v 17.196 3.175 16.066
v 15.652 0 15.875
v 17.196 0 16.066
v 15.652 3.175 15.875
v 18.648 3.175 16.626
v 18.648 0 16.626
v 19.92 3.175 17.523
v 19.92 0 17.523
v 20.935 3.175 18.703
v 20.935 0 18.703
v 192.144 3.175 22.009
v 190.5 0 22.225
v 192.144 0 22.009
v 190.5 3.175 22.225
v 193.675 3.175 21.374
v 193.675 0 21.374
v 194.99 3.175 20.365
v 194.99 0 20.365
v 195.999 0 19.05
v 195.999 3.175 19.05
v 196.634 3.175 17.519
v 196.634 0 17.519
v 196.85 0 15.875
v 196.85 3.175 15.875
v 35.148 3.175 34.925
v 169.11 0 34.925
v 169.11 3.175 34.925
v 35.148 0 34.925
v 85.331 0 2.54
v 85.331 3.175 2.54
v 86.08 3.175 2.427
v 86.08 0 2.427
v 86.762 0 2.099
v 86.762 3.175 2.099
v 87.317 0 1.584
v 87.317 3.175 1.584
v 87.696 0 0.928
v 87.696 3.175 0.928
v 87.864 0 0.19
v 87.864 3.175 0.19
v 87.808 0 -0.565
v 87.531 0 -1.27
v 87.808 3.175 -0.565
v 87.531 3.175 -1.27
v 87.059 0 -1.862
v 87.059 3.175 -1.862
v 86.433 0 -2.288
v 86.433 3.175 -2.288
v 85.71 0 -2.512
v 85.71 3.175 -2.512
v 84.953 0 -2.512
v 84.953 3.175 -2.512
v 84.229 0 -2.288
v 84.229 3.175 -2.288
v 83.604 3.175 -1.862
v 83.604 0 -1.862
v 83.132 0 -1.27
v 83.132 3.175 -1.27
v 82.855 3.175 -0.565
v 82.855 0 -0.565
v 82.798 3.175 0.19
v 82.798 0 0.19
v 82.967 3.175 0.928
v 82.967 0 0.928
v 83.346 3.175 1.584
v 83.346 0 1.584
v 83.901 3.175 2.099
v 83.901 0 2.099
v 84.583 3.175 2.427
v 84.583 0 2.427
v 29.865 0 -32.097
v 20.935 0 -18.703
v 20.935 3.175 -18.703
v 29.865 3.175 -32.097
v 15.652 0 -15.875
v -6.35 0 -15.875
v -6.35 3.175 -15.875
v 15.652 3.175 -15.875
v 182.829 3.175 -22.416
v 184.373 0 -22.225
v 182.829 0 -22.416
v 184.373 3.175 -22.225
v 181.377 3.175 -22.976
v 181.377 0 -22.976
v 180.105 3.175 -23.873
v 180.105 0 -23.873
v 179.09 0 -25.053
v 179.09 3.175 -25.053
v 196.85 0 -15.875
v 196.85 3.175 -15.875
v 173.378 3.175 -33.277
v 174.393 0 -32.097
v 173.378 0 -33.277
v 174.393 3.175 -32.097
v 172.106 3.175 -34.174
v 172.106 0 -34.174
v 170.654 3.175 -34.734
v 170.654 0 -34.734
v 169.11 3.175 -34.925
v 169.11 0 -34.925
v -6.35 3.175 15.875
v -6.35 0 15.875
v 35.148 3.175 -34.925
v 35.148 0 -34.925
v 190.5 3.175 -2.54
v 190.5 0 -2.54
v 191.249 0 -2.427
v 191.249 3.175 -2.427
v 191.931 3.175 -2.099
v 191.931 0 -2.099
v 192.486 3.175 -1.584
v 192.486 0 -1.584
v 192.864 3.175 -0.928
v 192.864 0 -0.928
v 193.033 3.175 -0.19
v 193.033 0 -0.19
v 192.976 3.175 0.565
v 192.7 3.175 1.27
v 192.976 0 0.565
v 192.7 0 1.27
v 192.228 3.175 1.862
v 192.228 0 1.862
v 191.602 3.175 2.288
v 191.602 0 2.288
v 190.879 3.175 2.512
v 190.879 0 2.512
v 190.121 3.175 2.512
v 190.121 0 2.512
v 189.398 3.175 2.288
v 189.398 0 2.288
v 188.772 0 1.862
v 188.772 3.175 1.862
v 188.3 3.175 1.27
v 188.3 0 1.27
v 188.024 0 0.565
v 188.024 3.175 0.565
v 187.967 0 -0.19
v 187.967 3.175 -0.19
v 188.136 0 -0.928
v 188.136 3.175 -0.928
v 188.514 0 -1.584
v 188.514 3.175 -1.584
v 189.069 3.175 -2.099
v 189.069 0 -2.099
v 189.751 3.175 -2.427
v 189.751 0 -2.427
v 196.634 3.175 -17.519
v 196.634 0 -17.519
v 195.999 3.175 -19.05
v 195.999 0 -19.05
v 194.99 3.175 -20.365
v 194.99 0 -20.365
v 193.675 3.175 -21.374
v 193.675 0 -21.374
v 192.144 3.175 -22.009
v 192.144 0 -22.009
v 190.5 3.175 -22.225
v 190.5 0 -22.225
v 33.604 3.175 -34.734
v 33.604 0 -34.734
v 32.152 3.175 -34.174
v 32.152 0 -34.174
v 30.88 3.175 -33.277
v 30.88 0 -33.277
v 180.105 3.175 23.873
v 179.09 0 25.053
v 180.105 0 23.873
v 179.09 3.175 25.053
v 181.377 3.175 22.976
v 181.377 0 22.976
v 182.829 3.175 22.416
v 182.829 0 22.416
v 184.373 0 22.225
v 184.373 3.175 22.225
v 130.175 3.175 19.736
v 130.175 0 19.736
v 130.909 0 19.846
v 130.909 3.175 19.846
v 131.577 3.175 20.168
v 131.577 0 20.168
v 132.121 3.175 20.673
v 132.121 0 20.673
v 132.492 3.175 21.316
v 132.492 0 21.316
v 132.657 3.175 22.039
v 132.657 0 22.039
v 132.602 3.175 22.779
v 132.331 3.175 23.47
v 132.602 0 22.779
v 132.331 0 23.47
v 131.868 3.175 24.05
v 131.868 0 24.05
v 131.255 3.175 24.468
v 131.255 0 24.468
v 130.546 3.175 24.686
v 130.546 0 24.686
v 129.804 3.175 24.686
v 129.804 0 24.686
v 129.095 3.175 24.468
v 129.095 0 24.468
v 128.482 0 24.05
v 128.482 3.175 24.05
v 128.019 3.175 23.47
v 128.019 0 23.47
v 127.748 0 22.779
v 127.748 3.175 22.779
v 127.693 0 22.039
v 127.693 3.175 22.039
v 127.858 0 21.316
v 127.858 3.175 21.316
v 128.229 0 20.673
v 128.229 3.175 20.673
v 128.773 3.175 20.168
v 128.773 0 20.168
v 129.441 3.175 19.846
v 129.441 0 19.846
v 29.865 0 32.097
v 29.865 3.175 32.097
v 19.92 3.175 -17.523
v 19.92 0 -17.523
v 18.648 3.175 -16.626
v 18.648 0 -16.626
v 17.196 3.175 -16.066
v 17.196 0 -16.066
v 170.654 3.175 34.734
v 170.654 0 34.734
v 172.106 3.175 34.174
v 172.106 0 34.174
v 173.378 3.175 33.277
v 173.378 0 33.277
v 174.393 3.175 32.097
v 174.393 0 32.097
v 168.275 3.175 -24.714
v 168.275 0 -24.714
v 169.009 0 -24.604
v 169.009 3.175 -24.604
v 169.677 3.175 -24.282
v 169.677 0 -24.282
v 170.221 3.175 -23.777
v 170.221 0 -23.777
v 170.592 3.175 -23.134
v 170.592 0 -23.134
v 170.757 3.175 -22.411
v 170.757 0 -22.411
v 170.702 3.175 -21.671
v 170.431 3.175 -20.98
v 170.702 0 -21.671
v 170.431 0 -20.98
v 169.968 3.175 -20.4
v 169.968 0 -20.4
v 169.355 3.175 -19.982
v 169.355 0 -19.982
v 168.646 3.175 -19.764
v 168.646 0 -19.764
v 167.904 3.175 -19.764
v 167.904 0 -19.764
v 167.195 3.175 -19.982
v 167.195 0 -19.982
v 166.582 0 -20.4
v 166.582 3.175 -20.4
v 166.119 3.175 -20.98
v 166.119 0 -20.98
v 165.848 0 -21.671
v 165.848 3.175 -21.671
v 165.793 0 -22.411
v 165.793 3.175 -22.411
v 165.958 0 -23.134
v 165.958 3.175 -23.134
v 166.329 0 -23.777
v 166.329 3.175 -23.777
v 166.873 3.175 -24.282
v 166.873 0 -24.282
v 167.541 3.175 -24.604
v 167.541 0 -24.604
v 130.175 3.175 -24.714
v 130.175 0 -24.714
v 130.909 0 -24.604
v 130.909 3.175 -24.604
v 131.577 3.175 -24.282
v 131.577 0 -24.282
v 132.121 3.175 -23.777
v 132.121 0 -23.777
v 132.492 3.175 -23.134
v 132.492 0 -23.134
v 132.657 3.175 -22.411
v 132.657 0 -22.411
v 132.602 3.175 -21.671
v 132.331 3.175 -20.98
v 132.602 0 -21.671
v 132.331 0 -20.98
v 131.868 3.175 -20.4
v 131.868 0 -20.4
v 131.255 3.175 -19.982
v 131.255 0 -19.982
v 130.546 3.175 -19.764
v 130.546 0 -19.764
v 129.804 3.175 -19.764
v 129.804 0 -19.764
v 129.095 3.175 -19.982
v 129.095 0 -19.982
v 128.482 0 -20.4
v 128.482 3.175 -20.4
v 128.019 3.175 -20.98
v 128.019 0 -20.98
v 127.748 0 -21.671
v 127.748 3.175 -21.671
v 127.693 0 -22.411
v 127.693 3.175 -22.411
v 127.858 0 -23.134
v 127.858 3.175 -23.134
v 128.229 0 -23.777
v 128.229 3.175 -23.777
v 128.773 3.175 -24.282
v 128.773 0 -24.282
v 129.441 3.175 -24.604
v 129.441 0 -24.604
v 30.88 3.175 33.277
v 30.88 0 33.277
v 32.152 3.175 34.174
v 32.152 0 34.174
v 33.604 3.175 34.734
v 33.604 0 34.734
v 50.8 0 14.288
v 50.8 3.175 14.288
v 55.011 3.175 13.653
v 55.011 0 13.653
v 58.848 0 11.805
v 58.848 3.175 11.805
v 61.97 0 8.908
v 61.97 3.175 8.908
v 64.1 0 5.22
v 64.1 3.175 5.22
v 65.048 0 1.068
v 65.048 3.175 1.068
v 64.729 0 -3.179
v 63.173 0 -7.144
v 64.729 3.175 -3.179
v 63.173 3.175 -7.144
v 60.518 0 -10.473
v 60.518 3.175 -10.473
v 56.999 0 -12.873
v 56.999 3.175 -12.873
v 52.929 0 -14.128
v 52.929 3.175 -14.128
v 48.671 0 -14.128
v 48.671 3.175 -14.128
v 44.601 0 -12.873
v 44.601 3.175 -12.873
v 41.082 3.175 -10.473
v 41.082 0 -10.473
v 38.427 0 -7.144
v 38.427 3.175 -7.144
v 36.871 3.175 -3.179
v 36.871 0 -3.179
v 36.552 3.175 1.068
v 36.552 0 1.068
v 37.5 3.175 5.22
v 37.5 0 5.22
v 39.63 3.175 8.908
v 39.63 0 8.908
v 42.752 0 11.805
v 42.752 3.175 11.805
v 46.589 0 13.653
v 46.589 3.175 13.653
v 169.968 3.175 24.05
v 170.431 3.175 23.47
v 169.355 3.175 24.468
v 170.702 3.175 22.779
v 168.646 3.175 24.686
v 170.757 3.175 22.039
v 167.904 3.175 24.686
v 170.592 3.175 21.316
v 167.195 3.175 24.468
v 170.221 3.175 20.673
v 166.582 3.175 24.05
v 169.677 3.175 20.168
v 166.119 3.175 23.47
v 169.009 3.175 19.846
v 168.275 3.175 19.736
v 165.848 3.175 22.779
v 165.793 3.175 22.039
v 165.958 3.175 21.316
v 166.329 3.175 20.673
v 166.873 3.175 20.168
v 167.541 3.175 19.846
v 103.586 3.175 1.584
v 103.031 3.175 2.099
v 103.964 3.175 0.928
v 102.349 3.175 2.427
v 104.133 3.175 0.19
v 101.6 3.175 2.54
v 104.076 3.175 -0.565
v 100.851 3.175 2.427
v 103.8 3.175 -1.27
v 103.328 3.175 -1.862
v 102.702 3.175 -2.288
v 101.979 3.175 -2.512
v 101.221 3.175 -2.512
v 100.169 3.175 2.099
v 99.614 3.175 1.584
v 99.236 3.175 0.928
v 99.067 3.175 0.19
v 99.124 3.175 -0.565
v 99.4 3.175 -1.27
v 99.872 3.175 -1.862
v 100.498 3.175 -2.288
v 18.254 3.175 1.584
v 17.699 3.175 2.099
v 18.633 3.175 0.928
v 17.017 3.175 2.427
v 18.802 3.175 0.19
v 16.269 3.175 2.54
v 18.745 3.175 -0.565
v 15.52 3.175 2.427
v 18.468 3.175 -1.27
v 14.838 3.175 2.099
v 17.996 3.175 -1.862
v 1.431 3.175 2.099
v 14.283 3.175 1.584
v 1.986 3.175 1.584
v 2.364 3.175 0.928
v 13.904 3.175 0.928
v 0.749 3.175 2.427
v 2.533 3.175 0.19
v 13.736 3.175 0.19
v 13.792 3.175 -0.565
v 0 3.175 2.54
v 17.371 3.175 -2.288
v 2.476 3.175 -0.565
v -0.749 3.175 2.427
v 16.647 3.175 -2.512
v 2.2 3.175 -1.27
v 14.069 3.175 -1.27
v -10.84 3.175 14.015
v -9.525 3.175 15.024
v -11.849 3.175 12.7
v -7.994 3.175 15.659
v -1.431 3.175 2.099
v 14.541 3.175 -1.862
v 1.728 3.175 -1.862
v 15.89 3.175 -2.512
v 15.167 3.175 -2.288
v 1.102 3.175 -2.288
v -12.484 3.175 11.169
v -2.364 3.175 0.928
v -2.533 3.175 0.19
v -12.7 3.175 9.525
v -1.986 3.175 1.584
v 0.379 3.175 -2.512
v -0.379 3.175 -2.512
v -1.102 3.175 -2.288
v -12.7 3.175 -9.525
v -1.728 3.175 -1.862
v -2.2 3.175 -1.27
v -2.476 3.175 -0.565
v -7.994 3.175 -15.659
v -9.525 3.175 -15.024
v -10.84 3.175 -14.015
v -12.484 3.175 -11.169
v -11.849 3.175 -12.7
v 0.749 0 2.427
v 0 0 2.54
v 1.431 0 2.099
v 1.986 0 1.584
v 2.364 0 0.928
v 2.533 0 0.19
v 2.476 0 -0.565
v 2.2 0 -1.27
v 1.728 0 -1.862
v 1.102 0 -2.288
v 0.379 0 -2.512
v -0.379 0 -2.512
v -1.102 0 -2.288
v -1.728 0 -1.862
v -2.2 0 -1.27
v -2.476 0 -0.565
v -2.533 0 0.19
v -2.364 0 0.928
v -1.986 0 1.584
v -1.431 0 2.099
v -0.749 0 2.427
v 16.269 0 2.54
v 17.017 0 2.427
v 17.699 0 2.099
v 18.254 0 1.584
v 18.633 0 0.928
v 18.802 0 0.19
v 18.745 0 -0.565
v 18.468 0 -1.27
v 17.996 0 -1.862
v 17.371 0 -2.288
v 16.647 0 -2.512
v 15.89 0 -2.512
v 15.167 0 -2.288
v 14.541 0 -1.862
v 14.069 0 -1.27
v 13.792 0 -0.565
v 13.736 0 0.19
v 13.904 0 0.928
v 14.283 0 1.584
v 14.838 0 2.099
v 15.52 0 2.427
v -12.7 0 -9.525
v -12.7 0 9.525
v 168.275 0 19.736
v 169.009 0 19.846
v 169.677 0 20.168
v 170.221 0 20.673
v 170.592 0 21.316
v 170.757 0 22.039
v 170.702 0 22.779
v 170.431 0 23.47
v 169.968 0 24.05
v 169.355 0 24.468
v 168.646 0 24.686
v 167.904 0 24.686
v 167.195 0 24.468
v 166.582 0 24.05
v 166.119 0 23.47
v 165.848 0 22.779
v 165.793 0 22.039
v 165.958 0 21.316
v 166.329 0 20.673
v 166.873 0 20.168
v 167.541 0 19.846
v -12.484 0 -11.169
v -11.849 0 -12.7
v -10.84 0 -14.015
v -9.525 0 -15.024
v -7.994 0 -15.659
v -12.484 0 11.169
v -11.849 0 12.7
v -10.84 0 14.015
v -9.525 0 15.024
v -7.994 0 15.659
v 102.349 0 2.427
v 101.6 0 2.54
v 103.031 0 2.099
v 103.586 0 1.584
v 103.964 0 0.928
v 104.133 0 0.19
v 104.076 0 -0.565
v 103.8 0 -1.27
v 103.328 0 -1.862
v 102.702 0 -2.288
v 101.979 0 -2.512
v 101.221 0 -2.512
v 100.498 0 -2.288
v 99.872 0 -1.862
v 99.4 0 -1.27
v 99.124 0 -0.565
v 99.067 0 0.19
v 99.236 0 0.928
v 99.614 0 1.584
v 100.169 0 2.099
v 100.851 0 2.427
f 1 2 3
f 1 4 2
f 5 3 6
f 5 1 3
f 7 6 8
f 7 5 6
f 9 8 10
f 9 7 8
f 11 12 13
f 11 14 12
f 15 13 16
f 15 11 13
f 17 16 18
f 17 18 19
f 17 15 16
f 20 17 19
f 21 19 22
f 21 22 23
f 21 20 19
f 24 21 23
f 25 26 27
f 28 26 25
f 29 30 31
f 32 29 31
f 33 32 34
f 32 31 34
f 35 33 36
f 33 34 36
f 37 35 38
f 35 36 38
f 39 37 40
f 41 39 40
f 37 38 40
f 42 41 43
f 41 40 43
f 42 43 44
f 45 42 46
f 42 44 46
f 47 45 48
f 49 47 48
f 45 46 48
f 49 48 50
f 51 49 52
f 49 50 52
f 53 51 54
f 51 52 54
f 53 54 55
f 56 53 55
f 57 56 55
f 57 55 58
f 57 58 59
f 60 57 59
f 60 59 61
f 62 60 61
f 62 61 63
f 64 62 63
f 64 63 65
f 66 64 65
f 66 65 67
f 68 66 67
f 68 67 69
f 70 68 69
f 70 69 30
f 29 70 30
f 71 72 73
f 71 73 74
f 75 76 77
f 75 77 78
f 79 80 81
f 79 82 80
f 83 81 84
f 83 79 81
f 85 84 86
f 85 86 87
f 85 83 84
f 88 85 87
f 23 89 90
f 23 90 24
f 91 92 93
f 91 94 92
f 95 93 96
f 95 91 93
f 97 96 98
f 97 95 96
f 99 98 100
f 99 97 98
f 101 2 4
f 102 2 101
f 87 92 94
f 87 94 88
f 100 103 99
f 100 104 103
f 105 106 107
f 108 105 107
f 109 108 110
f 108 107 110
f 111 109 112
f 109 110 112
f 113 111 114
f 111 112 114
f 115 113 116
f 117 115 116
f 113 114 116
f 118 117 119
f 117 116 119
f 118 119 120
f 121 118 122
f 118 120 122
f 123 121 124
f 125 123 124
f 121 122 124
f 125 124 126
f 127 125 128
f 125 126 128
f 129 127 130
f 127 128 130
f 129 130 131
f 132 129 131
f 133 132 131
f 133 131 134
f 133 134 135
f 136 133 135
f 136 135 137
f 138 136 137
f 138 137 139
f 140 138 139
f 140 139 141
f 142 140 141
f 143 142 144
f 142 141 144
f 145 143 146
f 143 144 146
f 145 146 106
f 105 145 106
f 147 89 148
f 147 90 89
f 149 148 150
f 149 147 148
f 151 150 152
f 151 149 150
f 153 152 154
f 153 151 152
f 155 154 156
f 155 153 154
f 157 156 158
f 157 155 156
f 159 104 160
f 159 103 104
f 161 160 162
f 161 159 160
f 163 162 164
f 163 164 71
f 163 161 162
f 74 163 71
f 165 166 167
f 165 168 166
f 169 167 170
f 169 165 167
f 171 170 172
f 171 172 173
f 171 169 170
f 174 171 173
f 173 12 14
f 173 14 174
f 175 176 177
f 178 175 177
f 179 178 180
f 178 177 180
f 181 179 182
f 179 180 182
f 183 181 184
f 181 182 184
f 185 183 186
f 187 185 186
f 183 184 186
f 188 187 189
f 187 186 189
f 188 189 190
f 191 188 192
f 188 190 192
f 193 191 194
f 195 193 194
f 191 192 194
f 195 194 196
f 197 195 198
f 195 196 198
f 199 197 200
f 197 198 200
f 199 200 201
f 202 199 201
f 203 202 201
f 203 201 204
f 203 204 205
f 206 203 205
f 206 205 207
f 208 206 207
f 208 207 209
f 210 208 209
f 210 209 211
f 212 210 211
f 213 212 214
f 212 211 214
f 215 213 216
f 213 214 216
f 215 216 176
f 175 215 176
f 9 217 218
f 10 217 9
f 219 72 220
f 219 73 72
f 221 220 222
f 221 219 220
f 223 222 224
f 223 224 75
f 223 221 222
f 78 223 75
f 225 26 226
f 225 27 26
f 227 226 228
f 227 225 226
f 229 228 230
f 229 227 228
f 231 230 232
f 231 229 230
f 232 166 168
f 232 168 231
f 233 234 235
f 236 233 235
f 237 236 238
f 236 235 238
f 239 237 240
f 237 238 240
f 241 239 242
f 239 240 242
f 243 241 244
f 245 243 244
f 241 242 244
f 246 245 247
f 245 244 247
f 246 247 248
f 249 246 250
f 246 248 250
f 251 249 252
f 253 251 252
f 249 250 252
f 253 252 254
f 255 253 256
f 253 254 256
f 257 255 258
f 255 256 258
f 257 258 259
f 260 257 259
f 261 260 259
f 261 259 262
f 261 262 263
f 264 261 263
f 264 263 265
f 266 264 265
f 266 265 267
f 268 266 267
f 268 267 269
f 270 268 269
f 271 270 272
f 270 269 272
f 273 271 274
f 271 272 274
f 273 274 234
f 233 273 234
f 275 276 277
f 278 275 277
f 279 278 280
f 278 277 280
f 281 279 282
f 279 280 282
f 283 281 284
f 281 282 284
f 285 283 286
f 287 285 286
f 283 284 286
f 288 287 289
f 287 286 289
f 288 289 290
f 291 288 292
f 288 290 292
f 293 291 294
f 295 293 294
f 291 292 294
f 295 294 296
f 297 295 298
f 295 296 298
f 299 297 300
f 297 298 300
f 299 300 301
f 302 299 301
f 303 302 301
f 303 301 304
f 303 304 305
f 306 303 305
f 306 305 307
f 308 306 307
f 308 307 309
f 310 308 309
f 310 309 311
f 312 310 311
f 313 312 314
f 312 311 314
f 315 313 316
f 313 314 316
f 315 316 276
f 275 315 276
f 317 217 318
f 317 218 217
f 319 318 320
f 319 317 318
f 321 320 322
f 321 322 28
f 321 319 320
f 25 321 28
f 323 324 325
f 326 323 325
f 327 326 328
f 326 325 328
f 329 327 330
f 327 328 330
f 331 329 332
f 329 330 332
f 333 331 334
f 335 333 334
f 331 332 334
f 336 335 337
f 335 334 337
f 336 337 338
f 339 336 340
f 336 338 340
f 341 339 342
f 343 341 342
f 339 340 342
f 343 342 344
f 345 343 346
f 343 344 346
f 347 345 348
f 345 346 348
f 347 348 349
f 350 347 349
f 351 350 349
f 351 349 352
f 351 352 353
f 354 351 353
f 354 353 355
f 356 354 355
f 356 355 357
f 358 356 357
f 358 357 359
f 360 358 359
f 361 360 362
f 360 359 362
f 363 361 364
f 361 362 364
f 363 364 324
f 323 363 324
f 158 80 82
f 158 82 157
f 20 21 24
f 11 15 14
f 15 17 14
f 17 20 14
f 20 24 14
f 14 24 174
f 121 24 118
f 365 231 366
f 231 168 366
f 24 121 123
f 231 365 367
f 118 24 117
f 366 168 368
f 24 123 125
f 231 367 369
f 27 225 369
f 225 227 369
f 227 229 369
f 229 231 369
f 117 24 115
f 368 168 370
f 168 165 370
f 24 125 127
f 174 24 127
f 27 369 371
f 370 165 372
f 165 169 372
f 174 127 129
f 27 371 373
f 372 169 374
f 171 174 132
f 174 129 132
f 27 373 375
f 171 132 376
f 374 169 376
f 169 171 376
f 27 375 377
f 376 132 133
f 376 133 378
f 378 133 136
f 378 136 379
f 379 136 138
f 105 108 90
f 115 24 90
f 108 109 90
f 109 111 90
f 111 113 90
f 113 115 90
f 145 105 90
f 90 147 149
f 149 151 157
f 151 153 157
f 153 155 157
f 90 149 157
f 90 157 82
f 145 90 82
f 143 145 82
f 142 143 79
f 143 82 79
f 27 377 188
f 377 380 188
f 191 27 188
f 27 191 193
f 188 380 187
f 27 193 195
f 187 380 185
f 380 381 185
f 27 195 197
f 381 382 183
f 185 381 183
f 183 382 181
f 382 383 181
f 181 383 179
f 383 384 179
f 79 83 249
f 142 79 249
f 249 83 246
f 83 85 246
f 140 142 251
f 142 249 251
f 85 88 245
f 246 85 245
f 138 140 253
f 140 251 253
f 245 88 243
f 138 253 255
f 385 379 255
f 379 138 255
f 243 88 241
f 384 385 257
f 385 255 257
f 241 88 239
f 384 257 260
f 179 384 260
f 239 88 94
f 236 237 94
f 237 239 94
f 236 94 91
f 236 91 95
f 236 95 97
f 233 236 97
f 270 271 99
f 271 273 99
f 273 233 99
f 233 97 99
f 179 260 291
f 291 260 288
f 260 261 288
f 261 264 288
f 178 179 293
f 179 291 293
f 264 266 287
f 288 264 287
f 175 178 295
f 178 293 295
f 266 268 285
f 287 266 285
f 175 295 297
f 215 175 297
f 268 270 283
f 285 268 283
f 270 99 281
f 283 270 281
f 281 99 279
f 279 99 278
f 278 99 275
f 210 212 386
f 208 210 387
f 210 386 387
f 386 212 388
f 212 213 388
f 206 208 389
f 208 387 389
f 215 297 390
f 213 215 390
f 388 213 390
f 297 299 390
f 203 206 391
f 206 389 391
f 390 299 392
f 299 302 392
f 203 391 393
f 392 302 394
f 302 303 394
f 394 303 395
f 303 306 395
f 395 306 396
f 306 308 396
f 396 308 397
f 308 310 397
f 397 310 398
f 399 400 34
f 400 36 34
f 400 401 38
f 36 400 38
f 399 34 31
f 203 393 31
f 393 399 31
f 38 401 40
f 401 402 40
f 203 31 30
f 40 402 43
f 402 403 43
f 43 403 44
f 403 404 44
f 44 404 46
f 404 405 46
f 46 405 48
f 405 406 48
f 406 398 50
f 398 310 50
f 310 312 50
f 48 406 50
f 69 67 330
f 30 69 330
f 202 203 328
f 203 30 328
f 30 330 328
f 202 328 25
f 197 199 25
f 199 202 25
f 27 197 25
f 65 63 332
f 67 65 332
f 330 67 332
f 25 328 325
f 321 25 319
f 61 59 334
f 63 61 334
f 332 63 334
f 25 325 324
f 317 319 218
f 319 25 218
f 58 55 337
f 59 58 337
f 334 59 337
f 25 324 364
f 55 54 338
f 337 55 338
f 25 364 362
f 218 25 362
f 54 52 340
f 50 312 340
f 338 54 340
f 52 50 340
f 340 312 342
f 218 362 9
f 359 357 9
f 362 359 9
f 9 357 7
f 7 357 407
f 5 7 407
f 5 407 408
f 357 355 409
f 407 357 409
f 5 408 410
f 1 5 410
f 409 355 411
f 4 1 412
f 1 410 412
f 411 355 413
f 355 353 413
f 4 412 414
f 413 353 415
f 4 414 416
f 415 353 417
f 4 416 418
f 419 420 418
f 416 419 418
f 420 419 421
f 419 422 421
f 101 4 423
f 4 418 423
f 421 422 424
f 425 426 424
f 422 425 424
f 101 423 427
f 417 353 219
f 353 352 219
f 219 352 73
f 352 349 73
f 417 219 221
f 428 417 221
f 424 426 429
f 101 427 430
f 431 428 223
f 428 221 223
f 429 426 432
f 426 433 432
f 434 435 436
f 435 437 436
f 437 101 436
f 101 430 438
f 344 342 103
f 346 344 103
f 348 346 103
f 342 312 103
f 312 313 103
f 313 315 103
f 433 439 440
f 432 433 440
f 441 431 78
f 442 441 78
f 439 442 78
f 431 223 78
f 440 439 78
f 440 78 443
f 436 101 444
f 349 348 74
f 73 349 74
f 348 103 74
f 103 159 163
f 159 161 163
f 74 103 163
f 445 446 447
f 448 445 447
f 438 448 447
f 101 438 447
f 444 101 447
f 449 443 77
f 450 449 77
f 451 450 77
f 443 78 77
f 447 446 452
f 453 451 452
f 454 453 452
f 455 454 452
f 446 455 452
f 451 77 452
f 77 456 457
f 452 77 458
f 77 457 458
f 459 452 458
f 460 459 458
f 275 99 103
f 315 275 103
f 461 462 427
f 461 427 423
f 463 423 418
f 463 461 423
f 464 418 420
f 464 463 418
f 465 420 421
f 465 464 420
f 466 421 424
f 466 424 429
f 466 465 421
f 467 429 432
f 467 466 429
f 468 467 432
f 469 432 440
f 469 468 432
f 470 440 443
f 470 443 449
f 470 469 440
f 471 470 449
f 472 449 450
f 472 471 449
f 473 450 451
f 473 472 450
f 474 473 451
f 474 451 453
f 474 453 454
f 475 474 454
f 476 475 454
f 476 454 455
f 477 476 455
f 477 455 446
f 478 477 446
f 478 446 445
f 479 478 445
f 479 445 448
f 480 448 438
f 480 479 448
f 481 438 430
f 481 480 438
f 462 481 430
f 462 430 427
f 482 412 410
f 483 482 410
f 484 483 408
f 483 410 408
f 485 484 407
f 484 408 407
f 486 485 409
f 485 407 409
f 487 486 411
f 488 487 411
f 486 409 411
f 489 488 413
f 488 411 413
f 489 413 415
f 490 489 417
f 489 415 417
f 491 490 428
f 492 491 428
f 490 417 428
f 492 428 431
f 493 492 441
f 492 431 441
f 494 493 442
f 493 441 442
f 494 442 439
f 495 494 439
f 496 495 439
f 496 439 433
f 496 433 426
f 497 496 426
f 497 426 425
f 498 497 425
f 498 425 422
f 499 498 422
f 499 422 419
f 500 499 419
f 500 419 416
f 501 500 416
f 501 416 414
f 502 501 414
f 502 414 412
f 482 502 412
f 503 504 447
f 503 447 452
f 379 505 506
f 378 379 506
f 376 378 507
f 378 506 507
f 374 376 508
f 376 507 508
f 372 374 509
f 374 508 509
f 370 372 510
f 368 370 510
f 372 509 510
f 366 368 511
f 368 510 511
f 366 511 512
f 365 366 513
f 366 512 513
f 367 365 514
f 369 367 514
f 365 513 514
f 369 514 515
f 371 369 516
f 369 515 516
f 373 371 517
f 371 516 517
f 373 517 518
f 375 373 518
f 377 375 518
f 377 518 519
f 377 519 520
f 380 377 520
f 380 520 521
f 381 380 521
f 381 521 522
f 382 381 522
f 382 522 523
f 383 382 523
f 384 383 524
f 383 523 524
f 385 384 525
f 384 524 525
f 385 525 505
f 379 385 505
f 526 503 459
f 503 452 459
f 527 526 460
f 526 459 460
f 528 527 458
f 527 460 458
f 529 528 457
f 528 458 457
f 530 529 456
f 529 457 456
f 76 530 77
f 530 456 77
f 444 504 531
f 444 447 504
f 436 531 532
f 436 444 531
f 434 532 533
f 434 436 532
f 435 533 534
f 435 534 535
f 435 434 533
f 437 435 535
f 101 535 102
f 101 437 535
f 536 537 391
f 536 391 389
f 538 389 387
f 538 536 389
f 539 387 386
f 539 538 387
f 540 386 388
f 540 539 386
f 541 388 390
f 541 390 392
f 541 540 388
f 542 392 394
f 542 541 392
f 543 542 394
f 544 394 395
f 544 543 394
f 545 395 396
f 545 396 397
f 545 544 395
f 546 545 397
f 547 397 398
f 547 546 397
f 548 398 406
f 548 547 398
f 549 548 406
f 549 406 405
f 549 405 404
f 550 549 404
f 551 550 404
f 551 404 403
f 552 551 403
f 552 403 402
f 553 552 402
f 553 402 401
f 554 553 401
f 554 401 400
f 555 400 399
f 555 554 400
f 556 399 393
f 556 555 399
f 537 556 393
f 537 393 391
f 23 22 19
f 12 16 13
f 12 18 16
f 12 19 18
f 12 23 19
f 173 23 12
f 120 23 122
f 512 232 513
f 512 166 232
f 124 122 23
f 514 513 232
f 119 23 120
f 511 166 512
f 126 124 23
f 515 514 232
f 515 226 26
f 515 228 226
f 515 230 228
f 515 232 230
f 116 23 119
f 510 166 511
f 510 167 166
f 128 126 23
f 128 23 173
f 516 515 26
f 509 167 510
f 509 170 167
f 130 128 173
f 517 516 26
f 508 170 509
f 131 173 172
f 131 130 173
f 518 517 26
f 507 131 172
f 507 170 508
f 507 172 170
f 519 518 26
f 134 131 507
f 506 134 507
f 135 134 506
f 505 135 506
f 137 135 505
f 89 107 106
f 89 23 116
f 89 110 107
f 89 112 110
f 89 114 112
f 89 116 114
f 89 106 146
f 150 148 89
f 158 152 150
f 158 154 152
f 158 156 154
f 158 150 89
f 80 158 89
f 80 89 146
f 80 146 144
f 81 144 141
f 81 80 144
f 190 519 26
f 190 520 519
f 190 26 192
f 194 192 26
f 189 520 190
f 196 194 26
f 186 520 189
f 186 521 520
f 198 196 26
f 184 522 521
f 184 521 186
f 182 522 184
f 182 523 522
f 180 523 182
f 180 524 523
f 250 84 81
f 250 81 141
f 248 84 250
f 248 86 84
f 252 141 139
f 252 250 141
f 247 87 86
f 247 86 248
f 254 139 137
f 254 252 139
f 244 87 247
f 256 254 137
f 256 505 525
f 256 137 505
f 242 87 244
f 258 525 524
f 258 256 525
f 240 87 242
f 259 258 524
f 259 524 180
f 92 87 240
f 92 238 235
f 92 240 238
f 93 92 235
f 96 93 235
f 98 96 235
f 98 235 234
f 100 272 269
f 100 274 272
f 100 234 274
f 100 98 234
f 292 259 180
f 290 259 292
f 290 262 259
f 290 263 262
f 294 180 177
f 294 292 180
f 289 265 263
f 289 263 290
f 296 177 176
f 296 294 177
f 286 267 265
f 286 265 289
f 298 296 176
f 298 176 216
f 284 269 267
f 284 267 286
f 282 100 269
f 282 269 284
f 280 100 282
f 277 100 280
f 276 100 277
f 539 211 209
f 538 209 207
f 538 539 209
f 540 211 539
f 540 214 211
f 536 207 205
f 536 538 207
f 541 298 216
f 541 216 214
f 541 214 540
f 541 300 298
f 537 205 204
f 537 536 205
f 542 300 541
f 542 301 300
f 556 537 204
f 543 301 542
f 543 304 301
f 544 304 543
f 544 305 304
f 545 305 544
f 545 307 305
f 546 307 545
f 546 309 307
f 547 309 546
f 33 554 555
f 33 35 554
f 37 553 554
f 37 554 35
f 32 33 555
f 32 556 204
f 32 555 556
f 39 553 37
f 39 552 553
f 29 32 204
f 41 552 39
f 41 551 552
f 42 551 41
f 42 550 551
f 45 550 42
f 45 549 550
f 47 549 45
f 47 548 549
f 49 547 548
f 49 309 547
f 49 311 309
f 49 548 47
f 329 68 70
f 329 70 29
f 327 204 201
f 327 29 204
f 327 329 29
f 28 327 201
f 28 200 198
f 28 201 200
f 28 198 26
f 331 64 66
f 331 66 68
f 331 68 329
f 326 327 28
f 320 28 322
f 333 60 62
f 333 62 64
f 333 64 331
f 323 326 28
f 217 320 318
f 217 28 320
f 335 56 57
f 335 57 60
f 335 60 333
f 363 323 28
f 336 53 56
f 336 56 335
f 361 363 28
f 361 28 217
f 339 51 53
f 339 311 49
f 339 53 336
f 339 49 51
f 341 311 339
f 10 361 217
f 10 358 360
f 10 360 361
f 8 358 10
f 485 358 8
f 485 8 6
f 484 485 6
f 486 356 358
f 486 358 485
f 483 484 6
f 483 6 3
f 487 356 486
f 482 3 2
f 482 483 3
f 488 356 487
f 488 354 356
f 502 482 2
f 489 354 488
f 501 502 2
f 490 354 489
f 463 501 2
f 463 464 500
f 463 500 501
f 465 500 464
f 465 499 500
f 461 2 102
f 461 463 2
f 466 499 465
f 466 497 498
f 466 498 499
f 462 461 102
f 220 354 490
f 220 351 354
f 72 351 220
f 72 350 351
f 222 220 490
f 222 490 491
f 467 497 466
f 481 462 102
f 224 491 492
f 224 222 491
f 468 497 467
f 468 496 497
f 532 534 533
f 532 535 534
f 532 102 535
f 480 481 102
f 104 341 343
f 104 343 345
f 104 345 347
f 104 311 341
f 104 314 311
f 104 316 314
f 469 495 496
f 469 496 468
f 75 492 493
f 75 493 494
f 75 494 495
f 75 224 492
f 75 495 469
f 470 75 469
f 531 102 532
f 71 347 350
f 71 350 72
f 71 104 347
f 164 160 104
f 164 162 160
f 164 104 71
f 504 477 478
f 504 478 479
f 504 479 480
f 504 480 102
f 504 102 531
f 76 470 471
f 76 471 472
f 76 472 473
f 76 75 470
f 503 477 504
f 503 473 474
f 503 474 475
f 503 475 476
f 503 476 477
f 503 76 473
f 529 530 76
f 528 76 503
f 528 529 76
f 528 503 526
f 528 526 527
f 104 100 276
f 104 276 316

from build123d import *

# Parameters (mm, degrees)
SKETCH1_R           = 2.54
BOSS_EXTRUDE1_DEPTH = 3.175
SKETCH2_R           = 14.2875
CUT_EXTRUDE1_DEPTH  = 3.175
SKETCH3_R           = 2.54
CUT_EXTRUDE2_DEPTH  = 120.558881937
SKETCH5_R           = 2.4892
SKETCH5_R_2         = 2.54
BOSS_EXTRUDE2_DEPTH = 3.175
FILLET1_R           = 6.35


with BuildPart() as part:
    # Sketch1 → Boss-Extrude1 (new body)
    with BuildSketch(Plane(origin=(0, 0, 0), x_dir=(1, 0, 0), z_dir=(0, 1, 0))):
        Polygon((19.05, 15.875), (31.75, 34.925), (69.85, 34.925), (82.55, 15.875), (114.3, 15.875), (114.3, -15.875), (82.55, -15.875), (69.85, -34.925), (31.75, -34.925), (19.05, -15.875), (-12.7, -15.875), (-12.7, 15.875), align=None)
        with Locations(Location((0, 0, 0), (0, 0, 270))):
            Circle(SKETCH1_R, mode=Mode.SUBTRACT)
        with Locations(Location((101.6, 0, 0), (0, 0, 270))):
            Circle(SKETCH1_R, mode=Mode.SUBTRACT)
    extrude(amount=BOSS_EXTRUDE1_DEPTH)

    # Sketch2 → Cut-Extrude1 (cut)
    with BuildSketch(Plane(origin=(0, 3.175, 0), x_dir=(1, 0, 0), z_dir=(0, 1, 0))):
        with Locations(Location((50.8, 0, 0), (0, 0, 270))):
            Circle(SKETCH2_R)
    extrude(amount=-CUT_EXTRUDE1_DEPTH, mode=Mode.SUBTRACT)

    # Sketch3 → Cut-Extrude2 (cut, through all)
    with BuildSketch(Plane(origin=(0, 3.175, 0), x_dir=(1, 0, 0), z_dir=(0, 1, 0))):
        with Locations(Location((85.331391081, 0, 0), (0, 0, 270))):
            Circle(SKETCH3_R)
        with Locations(Location((16.268608919, 0, 0), (0, 0, 270))):
            Circle(SKETCH3_R)
    extrude(amount=-CUT_EXTRUDE2_DEPTH, mode=Mode.SUBTRACT)

    # Sketch5 → Boss-Extrude2 (add)
    with BuildSketch(Plane.XZ):
        Polygon((69.85, 34.925), (69.85, -34.925), (172.508333333, -34.925), (180.975, -22.225), (196.85, -22.225), (196.85, 22.225), (180.975, 22.225), (172.508333333, 34.925), align=None)
        with Locations(Location((130.175, -22.225, 0), (0, 0, 270))):
            Circle(SKETCH5_R, mode=Mode.SUBTRACT)
        with Locations(Location((168.275, -22.225, 0), (0, 0, 270))):
            Circle(SKETCH5_R, mode=Mode.SUBTRACT)
        with Locations(Location((85.331391081, 0, 0), (0, 0, 90))):
            Circle(SKETCH5_R_2, mode=Mode.SUBTRACT)
        with Locations(Location((101.6, 0, 0), (0, 0, 90))):
            Circle(SKETCH5_R_2, mode=Mode.SUBTRACT)
        with Locations(Location((130.175, 22.225, 0), (0, 0, 270))):
            Circle(SKETCH5_R, mode=Mode.SUBTRACT)
        with Locations(Location((190.5, 0, 0), (0, 0, 270))):
            Circle(SKETCH5_R_2, mode=Mode.SUBTRACT)
        with Locations(Location((168.275, 22.225, 0), (0, 0, 270))):
            Circle(SKETCH5_R, mode=Mode.SUBTRACT)
    extrude(amount=-BOSS_EXTRUDE2_DEPTH)

    # Fillet1
    fillet1_edges = [part.edges().sort_by_distance(p)[0] for p in [
        (19.05, 1.5875, -15.875),
        (31.75, 1.5875, -34.925),
        (31.75, 1.5875, 34.925),
        (19.05, 1.5875, 15.875),
        (-12.7, 1.5875, 15.875),
        (-12.7, 1.5875, -15.875),
        (172.508333333, 1.5875, 34.925),
        (172.508333333, 1.5875, -34.925),
        (180.975, 1.5875, -22.225),
        (196.85, 1.5875, -22.225),
        (196.85, 1.5875, 22.225),
        (180.975, 1.5875, 22.225),
    ]]
    fillet(fillet1_edges, radius=FILLET1_R)


solid = part.part
